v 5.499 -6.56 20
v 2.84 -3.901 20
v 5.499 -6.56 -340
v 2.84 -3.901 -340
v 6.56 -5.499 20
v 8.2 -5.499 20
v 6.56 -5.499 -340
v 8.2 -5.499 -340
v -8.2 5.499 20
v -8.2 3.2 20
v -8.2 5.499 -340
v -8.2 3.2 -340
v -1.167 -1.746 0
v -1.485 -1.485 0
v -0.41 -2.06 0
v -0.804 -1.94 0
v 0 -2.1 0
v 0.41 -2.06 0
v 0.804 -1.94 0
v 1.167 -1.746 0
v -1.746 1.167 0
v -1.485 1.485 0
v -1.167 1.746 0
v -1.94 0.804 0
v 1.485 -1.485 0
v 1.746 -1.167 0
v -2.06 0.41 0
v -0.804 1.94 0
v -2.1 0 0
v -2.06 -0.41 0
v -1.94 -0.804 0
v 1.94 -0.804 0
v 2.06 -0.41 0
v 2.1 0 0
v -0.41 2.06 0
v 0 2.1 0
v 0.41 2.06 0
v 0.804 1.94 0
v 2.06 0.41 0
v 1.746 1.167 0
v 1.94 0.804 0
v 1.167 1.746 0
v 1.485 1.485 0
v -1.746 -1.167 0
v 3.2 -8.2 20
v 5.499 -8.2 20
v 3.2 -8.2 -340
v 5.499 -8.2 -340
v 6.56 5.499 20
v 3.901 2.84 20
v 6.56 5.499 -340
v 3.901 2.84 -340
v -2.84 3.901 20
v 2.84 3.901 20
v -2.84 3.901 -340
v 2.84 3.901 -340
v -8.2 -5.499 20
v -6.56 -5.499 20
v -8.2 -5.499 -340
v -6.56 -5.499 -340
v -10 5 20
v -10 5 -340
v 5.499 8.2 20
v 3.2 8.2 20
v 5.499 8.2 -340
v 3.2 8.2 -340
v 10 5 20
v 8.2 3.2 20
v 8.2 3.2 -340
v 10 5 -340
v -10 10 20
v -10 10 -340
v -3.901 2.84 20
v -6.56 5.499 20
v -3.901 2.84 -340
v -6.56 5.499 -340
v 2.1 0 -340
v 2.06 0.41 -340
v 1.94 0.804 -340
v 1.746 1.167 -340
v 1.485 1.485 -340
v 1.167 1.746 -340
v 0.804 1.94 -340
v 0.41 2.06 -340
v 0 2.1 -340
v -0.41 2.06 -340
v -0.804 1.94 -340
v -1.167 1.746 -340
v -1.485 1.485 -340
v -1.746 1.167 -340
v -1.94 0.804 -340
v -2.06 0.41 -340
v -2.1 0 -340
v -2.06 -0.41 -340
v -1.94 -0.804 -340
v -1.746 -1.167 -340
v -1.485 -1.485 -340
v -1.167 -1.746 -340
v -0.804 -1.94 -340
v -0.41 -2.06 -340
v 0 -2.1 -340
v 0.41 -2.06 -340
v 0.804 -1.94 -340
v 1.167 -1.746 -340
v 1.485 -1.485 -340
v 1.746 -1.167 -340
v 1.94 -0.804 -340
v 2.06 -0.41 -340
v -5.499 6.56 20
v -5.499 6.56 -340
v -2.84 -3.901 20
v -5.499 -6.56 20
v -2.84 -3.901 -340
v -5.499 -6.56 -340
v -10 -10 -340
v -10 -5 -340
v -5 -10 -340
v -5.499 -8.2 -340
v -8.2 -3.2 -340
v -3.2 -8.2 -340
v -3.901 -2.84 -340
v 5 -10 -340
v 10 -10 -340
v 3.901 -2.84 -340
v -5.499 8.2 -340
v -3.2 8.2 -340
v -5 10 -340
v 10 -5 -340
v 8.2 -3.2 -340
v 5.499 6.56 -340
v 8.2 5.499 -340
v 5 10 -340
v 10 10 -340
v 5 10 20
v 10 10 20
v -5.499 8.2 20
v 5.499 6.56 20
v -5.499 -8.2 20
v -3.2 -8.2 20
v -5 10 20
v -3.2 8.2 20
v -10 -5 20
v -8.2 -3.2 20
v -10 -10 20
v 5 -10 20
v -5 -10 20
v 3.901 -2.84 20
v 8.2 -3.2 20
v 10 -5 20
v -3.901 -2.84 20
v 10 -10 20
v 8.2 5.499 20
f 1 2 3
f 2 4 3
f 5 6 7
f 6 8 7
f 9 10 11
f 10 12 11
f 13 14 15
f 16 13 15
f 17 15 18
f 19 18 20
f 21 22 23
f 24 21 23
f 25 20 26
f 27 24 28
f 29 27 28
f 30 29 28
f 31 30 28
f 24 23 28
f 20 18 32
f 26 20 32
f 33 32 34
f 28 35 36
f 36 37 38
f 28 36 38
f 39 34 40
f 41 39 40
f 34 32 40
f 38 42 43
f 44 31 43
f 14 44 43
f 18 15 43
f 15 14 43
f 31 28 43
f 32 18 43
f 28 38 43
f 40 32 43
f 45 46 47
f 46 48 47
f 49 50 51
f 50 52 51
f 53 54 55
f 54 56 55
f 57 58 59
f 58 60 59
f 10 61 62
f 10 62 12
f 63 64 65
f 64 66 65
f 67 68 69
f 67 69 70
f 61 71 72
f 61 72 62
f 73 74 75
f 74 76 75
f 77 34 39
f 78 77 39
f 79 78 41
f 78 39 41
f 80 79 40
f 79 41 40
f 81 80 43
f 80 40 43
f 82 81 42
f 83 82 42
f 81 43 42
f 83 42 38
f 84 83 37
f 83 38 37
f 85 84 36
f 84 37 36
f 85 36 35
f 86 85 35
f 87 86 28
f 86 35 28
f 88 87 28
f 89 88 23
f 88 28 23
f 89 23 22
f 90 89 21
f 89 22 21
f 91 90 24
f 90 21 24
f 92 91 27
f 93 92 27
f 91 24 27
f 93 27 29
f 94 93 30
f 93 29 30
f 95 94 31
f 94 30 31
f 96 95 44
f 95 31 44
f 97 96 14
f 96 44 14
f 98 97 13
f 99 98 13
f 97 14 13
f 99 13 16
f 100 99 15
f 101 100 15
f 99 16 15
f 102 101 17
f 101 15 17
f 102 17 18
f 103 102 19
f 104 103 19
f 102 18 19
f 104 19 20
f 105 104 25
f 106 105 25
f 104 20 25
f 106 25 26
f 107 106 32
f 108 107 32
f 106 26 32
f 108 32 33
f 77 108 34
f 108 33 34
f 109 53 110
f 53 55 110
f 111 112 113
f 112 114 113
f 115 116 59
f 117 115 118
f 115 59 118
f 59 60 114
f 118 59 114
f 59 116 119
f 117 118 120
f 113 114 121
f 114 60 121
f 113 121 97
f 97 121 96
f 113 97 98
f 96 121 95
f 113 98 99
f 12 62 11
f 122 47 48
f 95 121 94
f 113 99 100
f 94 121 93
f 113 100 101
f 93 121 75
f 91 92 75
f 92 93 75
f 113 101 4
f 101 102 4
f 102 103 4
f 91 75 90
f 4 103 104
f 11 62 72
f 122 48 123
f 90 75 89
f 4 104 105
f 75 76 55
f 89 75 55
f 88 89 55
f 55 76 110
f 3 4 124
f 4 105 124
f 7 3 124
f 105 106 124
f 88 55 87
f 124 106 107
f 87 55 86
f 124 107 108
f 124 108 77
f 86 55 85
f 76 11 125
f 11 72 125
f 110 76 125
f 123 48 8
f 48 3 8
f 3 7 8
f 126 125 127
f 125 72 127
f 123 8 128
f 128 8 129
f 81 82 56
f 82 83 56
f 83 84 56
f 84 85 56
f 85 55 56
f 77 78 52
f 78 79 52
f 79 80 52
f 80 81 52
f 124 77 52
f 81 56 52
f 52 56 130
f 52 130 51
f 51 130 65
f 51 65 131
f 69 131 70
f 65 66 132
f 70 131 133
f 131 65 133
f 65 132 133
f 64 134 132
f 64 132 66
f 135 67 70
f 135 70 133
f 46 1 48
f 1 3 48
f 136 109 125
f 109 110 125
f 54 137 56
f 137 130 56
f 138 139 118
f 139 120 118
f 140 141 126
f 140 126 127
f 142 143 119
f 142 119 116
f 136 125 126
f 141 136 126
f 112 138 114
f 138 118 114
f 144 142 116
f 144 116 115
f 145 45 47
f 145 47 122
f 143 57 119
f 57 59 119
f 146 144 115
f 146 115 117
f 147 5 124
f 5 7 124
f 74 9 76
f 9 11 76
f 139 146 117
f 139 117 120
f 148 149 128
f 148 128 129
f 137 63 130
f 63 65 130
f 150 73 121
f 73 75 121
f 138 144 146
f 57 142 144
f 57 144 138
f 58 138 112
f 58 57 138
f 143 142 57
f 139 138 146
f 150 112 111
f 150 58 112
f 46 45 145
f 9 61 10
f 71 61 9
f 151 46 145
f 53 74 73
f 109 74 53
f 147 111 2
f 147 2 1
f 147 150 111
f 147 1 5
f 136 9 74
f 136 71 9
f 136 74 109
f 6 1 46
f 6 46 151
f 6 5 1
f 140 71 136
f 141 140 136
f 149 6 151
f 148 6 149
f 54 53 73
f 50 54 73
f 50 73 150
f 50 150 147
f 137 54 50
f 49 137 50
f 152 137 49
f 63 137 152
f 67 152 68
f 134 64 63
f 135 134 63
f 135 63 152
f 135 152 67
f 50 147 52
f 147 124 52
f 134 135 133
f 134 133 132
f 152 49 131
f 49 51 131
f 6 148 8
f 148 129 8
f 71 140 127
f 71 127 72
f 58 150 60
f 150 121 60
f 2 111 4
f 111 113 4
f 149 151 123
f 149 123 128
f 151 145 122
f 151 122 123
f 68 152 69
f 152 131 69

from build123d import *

# Parameters (mm, degrees)
SKETCH1_R           = 2.1
BOSS_EXTRUDE1_DEPTH = 340
EXTRUDE_1_DEPTH     = 20


with BuildPart() as part:
    # Sketch1 → Boss-Extrude1 (new body)
    with BuildSketch(Plane.XY):
        Polygon((-10, 10), (-10, 5), (-8.2, 3.2), (-8.2, 5.499339828), (-6.56, 5.499339828), (-3.900660172, 2.84), (-3.900660172, -2.84), (-6.56, -5.499339828), (-8.2, -5.499339828), (-8.2, -3.2), (-10, -5), (-10, -10), (-5, -10), (-3.2, -8.2), (-5.499339828, -8.2), (-5.499339828, -6.56), (-2.84, -3.900660172), (2.84, -3.900660172), (5.499339828, -6.56), (5.499339828, -8.2), (3.2, -8.2), (5, -10), (10, -10), (10, -5), (8.2, -3.2), (8.2, -5.499339828), (6.56, -5.499339828), (3.900660172, -2.84), (3.900660172, 2.84), (6.56, 5.499339828), (8.2, 5.499339828), (8.2, 3.2), (10, 5), (10, 10), (5, 10), (3.2, 8.2), (5.499339828, 8.2), (5.499339828, 6.56), (2.84, 3.900660172), (-2.84, 3.900660172), (-5.499339828, 6.56), (-5.499339828, 8.2), (-3.2, 8.2), (-5, 10), align=None)
        Circle(SKETCH1_R, mode=Mode.SUBTRACT)
    extrude(amount=-BOSS_EXTRUDE1_DEPTH)

    # 草图1 → 凸台-拉伸1 (add)
    with BuildSketch(Plane.XY):
        Polygon((-5, 10), (-10, 10), (-10, 5), (-8.2, 3.2), (-8.2, 5.499339828), (-6.56, 5.499339828), (-3.900660172, 2.84), (-3.900660172, -2.84), (-6.56, -5.499339828), (-8.2, -5.499339828), (-8.2, -3.2), (-10, -5), (-10, -10), (-5, -10), (-3.2, -8.2), (-5.499339828, -8.2), (-5.499339828, -6.56), (-2.84, -3.900660172), (2.84, -3.900660172), (5.499339828, -6.56), (5.499339828, -8.2), (3.2, -8.2), (5, -10), (10, -10), (10, -5), (8.2, -3.2), (8.2, -5.499339828), (6.56, -5.499339828), (3.900660172, -2.84), (3.900660172, 2.84), (6.56, 5.499339828), (8.2, 5.499339828), (8.2, 3.2), (10, 5), (10, 10), (5, 10), (3.2, 8.2), (5.499339828, 8.2), (5.499339828, 6.56), (2.84, 3.900660172), (-2.84, 3.900660172), (-5.499339828, 6.56), (-5.499339828, 8.2), (-3.2, 8.2), align=None)
    extrude(amount=EXTRUDE_1_DEPTH)


solid = part.part
